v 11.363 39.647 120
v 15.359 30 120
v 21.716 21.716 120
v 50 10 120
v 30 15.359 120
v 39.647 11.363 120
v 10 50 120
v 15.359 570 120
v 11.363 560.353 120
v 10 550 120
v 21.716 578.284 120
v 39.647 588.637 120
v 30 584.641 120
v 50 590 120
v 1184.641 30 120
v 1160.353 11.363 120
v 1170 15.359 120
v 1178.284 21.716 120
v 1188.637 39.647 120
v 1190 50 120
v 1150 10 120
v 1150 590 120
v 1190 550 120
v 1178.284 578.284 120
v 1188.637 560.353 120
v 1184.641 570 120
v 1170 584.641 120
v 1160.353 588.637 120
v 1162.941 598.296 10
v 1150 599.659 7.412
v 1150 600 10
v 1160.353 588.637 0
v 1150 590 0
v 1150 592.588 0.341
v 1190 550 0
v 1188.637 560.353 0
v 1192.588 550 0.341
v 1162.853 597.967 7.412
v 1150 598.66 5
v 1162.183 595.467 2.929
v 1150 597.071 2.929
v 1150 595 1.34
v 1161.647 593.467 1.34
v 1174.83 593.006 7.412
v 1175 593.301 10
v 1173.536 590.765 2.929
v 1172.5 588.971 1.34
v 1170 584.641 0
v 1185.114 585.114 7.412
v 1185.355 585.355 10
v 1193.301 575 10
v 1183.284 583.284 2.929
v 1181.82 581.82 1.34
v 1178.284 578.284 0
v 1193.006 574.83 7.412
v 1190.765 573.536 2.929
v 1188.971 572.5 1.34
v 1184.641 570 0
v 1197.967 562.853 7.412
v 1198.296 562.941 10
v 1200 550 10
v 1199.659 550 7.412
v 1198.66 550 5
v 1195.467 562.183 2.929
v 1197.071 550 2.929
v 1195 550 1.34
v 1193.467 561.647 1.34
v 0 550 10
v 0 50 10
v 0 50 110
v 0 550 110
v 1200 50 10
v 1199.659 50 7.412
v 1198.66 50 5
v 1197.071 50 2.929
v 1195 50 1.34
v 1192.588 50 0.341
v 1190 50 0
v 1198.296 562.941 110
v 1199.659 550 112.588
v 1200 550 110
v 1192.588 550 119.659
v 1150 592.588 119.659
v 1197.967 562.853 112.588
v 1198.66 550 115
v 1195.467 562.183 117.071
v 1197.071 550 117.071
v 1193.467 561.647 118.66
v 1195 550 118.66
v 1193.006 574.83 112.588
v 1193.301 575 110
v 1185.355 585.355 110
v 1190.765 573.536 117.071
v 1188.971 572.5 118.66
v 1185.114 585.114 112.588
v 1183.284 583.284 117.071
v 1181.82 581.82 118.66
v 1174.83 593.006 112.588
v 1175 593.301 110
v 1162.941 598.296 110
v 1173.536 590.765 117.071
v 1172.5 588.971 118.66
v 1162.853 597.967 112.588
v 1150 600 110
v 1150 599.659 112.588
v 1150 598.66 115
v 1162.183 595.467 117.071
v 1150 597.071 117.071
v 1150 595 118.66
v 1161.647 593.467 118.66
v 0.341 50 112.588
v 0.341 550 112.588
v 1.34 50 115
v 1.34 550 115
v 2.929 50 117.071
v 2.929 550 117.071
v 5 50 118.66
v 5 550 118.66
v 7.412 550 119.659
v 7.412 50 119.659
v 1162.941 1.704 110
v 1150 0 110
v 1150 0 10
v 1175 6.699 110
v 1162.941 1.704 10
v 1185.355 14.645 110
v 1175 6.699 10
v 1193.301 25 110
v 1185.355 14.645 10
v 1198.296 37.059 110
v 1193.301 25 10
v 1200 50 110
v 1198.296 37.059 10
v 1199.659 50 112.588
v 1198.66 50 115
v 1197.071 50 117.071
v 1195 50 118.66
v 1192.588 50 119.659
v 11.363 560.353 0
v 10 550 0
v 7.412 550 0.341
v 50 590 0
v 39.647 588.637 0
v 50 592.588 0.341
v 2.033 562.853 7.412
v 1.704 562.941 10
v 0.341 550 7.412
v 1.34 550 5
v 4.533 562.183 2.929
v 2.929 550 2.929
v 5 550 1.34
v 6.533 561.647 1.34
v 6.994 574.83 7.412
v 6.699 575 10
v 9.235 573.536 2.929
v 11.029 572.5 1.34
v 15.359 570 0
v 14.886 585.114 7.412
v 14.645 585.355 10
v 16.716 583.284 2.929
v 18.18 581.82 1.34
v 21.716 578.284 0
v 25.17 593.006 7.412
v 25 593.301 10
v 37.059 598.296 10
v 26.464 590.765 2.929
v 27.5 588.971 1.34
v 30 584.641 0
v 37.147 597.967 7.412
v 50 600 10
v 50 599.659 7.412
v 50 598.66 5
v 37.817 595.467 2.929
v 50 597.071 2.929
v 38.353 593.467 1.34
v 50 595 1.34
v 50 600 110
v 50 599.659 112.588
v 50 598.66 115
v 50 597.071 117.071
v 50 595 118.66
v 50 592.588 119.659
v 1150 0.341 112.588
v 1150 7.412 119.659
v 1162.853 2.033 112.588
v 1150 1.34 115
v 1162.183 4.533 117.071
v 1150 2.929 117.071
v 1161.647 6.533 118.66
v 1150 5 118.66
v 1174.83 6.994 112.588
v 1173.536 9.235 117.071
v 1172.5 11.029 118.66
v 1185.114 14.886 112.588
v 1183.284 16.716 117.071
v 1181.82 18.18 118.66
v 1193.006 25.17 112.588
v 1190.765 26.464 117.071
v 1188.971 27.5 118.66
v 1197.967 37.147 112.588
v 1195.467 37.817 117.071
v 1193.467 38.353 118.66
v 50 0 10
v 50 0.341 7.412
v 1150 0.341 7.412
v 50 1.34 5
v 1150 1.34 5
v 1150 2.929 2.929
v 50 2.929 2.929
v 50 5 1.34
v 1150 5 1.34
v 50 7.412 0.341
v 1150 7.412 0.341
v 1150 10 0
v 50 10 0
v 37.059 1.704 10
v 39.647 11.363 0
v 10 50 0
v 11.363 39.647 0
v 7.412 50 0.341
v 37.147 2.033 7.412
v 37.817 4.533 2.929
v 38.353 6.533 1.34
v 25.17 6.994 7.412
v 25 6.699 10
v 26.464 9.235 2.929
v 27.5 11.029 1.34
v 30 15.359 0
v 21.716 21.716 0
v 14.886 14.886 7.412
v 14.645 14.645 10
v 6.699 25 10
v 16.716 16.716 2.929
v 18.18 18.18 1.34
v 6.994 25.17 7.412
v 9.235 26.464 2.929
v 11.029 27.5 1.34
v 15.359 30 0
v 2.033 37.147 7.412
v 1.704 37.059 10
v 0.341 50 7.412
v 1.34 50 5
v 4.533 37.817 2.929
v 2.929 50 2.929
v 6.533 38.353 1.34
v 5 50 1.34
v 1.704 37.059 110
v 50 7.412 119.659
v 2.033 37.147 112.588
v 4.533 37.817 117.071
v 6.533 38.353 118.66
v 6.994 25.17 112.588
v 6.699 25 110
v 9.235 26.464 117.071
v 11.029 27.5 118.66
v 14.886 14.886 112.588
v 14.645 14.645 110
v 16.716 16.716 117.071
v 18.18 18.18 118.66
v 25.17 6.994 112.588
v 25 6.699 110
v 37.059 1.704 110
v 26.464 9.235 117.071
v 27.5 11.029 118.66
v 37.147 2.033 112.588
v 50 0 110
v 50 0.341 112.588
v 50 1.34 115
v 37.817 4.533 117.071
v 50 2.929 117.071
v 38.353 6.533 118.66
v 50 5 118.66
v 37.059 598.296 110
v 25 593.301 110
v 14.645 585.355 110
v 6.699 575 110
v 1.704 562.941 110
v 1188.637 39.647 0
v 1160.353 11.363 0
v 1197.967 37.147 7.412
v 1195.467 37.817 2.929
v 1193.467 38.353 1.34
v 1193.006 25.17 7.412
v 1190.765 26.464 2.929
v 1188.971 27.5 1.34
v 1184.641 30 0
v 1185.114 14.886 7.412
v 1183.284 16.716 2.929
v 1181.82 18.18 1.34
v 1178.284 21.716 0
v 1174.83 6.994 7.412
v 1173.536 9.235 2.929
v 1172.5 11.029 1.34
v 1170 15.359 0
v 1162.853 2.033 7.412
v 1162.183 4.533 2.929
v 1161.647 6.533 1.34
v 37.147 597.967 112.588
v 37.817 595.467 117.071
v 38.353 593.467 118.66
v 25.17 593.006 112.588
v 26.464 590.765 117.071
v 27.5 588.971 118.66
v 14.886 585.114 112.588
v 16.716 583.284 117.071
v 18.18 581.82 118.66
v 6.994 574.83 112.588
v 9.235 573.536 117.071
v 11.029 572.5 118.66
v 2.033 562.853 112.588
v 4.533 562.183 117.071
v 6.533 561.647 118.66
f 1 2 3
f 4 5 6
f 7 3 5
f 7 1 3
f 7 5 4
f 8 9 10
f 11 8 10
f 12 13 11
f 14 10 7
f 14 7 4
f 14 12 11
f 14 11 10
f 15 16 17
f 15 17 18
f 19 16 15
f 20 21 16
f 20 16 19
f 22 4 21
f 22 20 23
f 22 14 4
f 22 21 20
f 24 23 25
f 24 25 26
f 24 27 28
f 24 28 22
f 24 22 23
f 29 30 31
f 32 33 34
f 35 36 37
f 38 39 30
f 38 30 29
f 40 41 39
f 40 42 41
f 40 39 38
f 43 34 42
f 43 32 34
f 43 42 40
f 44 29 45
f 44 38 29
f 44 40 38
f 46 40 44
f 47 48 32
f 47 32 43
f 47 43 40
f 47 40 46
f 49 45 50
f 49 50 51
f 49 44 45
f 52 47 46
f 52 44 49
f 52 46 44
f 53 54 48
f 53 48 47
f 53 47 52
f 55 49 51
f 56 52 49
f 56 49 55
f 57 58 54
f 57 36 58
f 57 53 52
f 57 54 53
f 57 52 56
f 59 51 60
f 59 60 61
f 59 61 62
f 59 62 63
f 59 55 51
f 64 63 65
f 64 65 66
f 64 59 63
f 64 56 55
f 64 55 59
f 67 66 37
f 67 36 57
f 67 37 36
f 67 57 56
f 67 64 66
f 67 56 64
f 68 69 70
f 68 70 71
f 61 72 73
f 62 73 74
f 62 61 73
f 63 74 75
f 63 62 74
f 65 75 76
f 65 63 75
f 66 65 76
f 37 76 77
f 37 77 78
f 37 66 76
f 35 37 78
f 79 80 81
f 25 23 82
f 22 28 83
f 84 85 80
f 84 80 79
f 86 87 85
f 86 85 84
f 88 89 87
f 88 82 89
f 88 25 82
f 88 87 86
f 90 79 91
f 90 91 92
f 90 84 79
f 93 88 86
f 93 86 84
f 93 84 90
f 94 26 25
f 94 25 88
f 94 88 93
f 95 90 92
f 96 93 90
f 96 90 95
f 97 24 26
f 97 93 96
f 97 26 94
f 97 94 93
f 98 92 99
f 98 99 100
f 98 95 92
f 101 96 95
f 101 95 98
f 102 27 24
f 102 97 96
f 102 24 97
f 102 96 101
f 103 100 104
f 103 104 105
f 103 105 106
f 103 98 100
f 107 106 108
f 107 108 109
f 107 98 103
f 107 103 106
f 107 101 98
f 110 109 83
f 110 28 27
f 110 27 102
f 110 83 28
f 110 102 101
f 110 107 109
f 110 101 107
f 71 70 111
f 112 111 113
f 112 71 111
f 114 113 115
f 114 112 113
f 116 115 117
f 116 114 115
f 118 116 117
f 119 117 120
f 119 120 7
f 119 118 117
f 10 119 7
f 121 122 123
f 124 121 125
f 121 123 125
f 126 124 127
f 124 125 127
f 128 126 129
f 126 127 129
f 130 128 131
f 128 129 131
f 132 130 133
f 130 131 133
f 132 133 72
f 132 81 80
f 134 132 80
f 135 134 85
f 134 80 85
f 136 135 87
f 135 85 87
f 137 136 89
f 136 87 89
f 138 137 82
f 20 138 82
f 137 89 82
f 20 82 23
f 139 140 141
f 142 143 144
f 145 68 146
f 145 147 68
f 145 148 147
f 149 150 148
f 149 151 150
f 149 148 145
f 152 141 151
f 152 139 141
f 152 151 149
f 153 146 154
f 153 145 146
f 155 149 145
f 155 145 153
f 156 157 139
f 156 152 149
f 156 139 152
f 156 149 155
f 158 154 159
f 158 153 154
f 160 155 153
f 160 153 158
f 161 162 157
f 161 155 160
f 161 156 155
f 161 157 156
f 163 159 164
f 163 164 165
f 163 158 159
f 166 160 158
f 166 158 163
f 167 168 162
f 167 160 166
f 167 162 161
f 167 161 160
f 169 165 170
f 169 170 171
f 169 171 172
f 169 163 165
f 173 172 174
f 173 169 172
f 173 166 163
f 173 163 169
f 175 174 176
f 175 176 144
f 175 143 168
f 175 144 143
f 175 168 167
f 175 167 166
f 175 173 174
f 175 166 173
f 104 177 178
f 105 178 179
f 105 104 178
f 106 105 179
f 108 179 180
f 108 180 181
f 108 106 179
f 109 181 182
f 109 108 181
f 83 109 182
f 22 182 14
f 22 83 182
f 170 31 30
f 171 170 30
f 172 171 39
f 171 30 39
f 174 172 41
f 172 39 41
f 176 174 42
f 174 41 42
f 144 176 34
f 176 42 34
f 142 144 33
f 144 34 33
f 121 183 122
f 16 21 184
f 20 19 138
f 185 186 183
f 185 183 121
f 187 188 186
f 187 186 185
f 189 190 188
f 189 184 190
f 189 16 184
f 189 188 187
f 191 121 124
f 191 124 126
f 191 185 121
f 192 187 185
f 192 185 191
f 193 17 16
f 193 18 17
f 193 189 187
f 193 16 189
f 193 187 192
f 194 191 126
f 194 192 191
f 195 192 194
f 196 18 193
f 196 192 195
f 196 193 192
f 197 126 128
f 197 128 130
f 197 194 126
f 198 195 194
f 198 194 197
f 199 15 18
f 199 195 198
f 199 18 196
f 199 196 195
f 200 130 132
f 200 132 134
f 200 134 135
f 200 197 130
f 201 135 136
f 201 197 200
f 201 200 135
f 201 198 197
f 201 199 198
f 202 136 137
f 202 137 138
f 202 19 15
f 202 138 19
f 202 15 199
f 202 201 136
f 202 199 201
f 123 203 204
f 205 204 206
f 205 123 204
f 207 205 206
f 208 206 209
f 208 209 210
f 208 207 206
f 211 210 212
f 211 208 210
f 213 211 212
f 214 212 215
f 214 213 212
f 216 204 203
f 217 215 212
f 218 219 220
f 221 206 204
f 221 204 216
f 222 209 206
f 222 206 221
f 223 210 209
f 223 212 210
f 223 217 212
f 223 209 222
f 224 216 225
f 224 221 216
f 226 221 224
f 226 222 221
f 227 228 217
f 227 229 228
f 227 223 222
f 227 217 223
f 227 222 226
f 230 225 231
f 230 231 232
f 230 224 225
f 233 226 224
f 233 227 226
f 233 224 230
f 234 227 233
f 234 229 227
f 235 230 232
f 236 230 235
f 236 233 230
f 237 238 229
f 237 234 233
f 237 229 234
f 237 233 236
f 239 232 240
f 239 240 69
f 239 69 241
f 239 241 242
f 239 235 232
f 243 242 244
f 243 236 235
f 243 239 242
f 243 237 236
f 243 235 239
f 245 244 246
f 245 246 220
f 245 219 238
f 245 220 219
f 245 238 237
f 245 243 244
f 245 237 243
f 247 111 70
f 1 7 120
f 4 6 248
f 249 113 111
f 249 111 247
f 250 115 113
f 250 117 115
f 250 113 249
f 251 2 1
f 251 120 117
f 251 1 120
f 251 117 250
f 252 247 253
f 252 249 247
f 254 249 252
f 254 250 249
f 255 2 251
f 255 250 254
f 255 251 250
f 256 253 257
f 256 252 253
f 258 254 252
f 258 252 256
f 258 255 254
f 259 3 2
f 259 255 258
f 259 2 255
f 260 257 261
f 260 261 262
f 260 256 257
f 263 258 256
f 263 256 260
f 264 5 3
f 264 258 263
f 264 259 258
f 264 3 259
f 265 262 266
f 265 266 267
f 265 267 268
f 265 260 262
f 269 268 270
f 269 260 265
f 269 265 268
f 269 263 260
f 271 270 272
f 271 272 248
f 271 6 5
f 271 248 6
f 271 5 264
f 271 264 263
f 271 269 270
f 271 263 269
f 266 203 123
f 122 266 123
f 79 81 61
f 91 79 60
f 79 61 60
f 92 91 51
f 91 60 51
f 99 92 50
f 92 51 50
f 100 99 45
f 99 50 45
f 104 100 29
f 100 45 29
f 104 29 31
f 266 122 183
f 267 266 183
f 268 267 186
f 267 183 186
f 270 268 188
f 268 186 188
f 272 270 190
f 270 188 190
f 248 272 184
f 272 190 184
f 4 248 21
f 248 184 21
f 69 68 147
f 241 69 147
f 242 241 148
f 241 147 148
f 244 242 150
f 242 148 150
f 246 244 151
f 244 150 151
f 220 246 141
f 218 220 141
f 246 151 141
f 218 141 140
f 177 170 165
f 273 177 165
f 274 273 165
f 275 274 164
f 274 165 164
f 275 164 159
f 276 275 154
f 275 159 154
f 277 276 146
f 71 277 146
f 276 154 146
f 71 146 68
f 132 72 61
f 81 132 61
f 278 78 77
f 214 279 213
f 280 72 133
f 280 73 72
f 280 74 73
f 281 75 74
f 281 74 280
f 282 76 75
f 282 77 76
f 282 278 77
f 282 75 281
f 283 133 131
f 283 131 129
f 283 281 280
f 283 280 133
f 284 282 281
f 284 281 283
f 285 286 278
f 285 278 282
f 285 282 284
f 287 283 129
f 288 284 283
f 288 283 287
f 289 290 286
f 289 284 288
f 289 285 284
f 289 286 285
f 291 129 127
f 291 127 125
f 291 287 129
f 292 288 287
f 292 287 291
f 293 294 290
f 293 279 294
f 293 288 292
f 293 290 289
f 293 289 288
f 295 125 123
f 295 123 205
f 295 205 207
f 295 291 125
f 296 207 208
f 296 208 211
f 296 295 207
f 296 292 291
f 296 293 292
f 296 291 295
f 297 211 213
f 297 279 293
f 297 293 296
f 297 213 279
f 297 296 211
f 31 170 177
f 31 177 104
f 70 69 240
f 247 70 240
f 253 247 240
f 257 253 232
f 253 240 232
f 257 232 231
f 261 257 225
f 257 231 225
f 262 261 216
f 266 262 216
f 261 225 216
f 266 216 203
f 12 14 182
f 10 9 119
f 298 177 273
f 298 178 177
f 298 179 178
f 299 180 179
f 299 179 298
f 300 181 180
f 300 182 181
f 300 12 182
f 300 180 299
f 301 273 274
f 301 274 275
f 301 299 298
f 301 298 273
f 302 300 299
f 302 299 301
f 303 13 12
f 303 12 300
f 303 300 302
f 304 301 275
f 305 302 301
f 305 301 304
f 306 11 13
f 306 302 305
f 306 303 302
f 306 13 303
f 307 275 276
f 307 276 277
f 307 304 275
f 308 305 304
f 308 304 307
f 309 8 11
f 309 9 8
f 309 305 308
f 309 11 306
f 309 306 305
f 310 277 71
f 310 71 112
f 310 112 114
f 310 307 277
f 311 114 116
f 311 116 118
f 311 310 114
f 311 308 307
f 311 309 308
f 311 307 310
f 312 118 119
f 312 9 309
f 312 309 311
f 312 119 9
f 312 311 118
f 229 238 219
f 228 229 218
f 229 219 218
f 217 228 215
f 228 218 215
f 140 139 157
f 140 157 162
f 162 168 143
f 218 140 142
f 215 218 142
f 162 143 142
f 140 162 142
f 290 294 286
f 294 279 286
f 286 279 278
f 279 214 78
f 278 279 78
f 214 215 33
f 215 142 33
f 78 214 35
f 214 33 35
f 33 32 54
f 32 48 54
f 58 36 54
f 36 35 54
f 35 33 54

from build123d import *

# Parameters (mm, degrees)
ESQUISSE1_W        = 1200
ESQUISSE1_H        = 600
BOSS_EXTRU_1_DEPTH = 120
CONG_1_R           = 10
CONG_2_R           = 50


with BuildPart() as part:
    # Esquisse1 → Boss.-Extru.1 (new body)
    with BuildSketch(Plane.XY):
        with Locations((600, 300)):
            Rectangle(ESQUISSE1_W, ESQUISSE1_H)
    extrude(amount=BOSS_EXTRU_1_DEPTH)

    # Congé1
    cong_1_edges = [part.edges().sort_by_distance(p)[0] for p in [
        (1200, 300, 120),
        (600, 600, 120),
        (0, 300, 120),
        (600, 600, 0),
        (1200, 300, 0),
        (600, 0, 0),
        (0, 300, 0),
        (600, 0, 120),
    ]]
    fillet(cong_1_edges, radius=CONG_1_R)

    # Congé2
    # the kernel refuses this fillet: 50 mm, written as the material it takes off along each edge
    with BuildSketch(Plane(origin=(50, 550, 0), x_dir=(-1, 0, 0), z_dir=(0, -1, 0))) as cong_2_piece_1:
        with BuildLine():
            CenterArc((40, -10), 10, 0, 90)
            Line((50, -10), (50, 0))
            Line((50, 0), (40, 0))
        make_face()
    revolve(axis=Axis((50, 550, 0), (0, 0, -1)), revolution_arc=90, mode=Mode.SUBTRACT)
    with BuildSketch(Plane(origin=(1150, 550, 0), x_dir=(0, 1, 0), z_dir=(-1, 0, 0))) as cong_2_piece_2:
        with BuildLine():
            CenterArc((40, -10), 10, 0, 90)
            Line((50, -10), (50, 0))
            Line((50, 0), (40, 0))
        make_face()
    revolve(axis=Axis((1150, 550, 0), (0, 0, -1)), revolution_arc=90, mode=Mode.SUBTRACT)
    with BuildSketch(Plane(origin=(50, 50, 0), x_dir=(0, -1, 0), z_dir=(1, 0, 0))) as cong_2_piece_3:
        with BuildLine():
            CenterArc((40, -10), 10, 0, 90)
            Line((50, -10), (50, 0))
            Line((50, 0), (40, 0))
        make_face()
    revolve(axis=Axis((50, 50, 0), (0, 0, -1)), revolution_arc=90, mode=Mode.SUBTRACT)
    with BuildSketch(Plane(origin=(1150, 50, 0), x_dir=(1, 0, 0), z_dir=(0, 1, 0))) as cong_2_piece_4:
        with BuildLine():
            CenterArc((40, -10), 10, 0, 90)
            Line((50, -10), (50, 0))
            Line((50, 0), (40, 0))
        make_face()
    revolve(axis=Axis((1150, 50, 0), (0, 0, -1)), revolution_arc=90, mode=Mode.SUBTRACT)
    with BuildSketch(Plane(origin=(1150, 50, 120), x_dir=(0, -1, 0), z_dir=(-1, 0, 0))) as cong_2_piece_5:
        with BuildLine():
            CenterArc((40, -10), 10, 0, 90)
            Line((50, -10), (50, 0))
            Line((50, 0), (40, 0))
        make_face()
    revolve(axis=Axis((1150, 50, 120), (0, 0, 1)), revolution_arc=90, mode=Mode.SUBTRACT)
    with BuildSketch(Plane(origin=(50, 50, 120), x_dir=(-1, 0, 0), z_dir=(0, 1, 0))) as cong_2_piece_6:
        with BuildLine():
            CenterArc((40, -10), 10, 0, 90)
            Line((50, -10), (50, 0))
            Line((50, 0), (40, 0))
        make_face()
    revolve(axis=Axis((50, 50, 120), (0, 0, 1)), revolution_arc=90, mode=Mode.SUBTRACT)
    with BuildSketch(Plane(origin=(1150, 550, 120), x_dir=(1, 0, 0), z_dir=(0, -1, 0))) as cong_2_piece_7:
        with BuildLine():
            CenterArc((40, -10), 10, 0, 90)
            Line((50, -10), (50, 0))
            Line((50, 0), (40, 0))
        make_face()
    revolve(axis=Axis((1150, 550, 120), (0, 0, 1)), revolution_arc=90, mode=Mode.SUBTRACT)
    with BuildSketch(Plane(origin=(50, 550, 120), x_dir=(0, 1, 0), z_dir=(1, 0, 0))) as cong_2_piece_8:
        with BuildLine():
            CenterArc((40, -10), 10, 0, 90)
            Line((50, -10), (50, 0))
            Line((50, 0), (40, 0))
        make_face()
    revolve(axis=Axis((50, 550, 120), (0, 0, 1)), revolution_arc=90, mode=Mode.SUBTRACT)
    with BuildSketch(Plane(origin=(1200, 0, 0), x_dir=(-1, 0, 0), z_dir=(0, 0, 1)), Plane(origin=(1200, 600, 0), x_dir=(0, -1, 0), z_dir=(0, 0, 1))) as cong_2_piece_9:
        with BuildLine():
            CenterArc((CONG_2_R, -CONG_2_R), CONG_2_R, 90, 90)
            Line((0, -CONG_2_R), (0, 0))
            Line((0, 0), (CONG_2_R, 0))
        make_face()
    extrude(amount=120, mode=Mode.SUBTRACT)
    with BuildSketch(Plane(origin=(0, 0, 0), x_dir=(1, 0, 0), z_dir=(0, 0, 1)), Plane(origin=(0, 600, 0), x_dir=(0, -1, 0), z_dir=(0, 0, 1))) as cong_2_piece_10:
        with BuildLine():
            CenterArc((CONG_2_R, CONG_2_R), CONG_2_R, 180, 90)
            Line((0, CONG_2_R), (0, 0))
            Line((0, 0), (CONG_2_R, 0))
        make_face()
    extrude(amount=120, mode=Mode.SUBTRACT)


solid = part.part
